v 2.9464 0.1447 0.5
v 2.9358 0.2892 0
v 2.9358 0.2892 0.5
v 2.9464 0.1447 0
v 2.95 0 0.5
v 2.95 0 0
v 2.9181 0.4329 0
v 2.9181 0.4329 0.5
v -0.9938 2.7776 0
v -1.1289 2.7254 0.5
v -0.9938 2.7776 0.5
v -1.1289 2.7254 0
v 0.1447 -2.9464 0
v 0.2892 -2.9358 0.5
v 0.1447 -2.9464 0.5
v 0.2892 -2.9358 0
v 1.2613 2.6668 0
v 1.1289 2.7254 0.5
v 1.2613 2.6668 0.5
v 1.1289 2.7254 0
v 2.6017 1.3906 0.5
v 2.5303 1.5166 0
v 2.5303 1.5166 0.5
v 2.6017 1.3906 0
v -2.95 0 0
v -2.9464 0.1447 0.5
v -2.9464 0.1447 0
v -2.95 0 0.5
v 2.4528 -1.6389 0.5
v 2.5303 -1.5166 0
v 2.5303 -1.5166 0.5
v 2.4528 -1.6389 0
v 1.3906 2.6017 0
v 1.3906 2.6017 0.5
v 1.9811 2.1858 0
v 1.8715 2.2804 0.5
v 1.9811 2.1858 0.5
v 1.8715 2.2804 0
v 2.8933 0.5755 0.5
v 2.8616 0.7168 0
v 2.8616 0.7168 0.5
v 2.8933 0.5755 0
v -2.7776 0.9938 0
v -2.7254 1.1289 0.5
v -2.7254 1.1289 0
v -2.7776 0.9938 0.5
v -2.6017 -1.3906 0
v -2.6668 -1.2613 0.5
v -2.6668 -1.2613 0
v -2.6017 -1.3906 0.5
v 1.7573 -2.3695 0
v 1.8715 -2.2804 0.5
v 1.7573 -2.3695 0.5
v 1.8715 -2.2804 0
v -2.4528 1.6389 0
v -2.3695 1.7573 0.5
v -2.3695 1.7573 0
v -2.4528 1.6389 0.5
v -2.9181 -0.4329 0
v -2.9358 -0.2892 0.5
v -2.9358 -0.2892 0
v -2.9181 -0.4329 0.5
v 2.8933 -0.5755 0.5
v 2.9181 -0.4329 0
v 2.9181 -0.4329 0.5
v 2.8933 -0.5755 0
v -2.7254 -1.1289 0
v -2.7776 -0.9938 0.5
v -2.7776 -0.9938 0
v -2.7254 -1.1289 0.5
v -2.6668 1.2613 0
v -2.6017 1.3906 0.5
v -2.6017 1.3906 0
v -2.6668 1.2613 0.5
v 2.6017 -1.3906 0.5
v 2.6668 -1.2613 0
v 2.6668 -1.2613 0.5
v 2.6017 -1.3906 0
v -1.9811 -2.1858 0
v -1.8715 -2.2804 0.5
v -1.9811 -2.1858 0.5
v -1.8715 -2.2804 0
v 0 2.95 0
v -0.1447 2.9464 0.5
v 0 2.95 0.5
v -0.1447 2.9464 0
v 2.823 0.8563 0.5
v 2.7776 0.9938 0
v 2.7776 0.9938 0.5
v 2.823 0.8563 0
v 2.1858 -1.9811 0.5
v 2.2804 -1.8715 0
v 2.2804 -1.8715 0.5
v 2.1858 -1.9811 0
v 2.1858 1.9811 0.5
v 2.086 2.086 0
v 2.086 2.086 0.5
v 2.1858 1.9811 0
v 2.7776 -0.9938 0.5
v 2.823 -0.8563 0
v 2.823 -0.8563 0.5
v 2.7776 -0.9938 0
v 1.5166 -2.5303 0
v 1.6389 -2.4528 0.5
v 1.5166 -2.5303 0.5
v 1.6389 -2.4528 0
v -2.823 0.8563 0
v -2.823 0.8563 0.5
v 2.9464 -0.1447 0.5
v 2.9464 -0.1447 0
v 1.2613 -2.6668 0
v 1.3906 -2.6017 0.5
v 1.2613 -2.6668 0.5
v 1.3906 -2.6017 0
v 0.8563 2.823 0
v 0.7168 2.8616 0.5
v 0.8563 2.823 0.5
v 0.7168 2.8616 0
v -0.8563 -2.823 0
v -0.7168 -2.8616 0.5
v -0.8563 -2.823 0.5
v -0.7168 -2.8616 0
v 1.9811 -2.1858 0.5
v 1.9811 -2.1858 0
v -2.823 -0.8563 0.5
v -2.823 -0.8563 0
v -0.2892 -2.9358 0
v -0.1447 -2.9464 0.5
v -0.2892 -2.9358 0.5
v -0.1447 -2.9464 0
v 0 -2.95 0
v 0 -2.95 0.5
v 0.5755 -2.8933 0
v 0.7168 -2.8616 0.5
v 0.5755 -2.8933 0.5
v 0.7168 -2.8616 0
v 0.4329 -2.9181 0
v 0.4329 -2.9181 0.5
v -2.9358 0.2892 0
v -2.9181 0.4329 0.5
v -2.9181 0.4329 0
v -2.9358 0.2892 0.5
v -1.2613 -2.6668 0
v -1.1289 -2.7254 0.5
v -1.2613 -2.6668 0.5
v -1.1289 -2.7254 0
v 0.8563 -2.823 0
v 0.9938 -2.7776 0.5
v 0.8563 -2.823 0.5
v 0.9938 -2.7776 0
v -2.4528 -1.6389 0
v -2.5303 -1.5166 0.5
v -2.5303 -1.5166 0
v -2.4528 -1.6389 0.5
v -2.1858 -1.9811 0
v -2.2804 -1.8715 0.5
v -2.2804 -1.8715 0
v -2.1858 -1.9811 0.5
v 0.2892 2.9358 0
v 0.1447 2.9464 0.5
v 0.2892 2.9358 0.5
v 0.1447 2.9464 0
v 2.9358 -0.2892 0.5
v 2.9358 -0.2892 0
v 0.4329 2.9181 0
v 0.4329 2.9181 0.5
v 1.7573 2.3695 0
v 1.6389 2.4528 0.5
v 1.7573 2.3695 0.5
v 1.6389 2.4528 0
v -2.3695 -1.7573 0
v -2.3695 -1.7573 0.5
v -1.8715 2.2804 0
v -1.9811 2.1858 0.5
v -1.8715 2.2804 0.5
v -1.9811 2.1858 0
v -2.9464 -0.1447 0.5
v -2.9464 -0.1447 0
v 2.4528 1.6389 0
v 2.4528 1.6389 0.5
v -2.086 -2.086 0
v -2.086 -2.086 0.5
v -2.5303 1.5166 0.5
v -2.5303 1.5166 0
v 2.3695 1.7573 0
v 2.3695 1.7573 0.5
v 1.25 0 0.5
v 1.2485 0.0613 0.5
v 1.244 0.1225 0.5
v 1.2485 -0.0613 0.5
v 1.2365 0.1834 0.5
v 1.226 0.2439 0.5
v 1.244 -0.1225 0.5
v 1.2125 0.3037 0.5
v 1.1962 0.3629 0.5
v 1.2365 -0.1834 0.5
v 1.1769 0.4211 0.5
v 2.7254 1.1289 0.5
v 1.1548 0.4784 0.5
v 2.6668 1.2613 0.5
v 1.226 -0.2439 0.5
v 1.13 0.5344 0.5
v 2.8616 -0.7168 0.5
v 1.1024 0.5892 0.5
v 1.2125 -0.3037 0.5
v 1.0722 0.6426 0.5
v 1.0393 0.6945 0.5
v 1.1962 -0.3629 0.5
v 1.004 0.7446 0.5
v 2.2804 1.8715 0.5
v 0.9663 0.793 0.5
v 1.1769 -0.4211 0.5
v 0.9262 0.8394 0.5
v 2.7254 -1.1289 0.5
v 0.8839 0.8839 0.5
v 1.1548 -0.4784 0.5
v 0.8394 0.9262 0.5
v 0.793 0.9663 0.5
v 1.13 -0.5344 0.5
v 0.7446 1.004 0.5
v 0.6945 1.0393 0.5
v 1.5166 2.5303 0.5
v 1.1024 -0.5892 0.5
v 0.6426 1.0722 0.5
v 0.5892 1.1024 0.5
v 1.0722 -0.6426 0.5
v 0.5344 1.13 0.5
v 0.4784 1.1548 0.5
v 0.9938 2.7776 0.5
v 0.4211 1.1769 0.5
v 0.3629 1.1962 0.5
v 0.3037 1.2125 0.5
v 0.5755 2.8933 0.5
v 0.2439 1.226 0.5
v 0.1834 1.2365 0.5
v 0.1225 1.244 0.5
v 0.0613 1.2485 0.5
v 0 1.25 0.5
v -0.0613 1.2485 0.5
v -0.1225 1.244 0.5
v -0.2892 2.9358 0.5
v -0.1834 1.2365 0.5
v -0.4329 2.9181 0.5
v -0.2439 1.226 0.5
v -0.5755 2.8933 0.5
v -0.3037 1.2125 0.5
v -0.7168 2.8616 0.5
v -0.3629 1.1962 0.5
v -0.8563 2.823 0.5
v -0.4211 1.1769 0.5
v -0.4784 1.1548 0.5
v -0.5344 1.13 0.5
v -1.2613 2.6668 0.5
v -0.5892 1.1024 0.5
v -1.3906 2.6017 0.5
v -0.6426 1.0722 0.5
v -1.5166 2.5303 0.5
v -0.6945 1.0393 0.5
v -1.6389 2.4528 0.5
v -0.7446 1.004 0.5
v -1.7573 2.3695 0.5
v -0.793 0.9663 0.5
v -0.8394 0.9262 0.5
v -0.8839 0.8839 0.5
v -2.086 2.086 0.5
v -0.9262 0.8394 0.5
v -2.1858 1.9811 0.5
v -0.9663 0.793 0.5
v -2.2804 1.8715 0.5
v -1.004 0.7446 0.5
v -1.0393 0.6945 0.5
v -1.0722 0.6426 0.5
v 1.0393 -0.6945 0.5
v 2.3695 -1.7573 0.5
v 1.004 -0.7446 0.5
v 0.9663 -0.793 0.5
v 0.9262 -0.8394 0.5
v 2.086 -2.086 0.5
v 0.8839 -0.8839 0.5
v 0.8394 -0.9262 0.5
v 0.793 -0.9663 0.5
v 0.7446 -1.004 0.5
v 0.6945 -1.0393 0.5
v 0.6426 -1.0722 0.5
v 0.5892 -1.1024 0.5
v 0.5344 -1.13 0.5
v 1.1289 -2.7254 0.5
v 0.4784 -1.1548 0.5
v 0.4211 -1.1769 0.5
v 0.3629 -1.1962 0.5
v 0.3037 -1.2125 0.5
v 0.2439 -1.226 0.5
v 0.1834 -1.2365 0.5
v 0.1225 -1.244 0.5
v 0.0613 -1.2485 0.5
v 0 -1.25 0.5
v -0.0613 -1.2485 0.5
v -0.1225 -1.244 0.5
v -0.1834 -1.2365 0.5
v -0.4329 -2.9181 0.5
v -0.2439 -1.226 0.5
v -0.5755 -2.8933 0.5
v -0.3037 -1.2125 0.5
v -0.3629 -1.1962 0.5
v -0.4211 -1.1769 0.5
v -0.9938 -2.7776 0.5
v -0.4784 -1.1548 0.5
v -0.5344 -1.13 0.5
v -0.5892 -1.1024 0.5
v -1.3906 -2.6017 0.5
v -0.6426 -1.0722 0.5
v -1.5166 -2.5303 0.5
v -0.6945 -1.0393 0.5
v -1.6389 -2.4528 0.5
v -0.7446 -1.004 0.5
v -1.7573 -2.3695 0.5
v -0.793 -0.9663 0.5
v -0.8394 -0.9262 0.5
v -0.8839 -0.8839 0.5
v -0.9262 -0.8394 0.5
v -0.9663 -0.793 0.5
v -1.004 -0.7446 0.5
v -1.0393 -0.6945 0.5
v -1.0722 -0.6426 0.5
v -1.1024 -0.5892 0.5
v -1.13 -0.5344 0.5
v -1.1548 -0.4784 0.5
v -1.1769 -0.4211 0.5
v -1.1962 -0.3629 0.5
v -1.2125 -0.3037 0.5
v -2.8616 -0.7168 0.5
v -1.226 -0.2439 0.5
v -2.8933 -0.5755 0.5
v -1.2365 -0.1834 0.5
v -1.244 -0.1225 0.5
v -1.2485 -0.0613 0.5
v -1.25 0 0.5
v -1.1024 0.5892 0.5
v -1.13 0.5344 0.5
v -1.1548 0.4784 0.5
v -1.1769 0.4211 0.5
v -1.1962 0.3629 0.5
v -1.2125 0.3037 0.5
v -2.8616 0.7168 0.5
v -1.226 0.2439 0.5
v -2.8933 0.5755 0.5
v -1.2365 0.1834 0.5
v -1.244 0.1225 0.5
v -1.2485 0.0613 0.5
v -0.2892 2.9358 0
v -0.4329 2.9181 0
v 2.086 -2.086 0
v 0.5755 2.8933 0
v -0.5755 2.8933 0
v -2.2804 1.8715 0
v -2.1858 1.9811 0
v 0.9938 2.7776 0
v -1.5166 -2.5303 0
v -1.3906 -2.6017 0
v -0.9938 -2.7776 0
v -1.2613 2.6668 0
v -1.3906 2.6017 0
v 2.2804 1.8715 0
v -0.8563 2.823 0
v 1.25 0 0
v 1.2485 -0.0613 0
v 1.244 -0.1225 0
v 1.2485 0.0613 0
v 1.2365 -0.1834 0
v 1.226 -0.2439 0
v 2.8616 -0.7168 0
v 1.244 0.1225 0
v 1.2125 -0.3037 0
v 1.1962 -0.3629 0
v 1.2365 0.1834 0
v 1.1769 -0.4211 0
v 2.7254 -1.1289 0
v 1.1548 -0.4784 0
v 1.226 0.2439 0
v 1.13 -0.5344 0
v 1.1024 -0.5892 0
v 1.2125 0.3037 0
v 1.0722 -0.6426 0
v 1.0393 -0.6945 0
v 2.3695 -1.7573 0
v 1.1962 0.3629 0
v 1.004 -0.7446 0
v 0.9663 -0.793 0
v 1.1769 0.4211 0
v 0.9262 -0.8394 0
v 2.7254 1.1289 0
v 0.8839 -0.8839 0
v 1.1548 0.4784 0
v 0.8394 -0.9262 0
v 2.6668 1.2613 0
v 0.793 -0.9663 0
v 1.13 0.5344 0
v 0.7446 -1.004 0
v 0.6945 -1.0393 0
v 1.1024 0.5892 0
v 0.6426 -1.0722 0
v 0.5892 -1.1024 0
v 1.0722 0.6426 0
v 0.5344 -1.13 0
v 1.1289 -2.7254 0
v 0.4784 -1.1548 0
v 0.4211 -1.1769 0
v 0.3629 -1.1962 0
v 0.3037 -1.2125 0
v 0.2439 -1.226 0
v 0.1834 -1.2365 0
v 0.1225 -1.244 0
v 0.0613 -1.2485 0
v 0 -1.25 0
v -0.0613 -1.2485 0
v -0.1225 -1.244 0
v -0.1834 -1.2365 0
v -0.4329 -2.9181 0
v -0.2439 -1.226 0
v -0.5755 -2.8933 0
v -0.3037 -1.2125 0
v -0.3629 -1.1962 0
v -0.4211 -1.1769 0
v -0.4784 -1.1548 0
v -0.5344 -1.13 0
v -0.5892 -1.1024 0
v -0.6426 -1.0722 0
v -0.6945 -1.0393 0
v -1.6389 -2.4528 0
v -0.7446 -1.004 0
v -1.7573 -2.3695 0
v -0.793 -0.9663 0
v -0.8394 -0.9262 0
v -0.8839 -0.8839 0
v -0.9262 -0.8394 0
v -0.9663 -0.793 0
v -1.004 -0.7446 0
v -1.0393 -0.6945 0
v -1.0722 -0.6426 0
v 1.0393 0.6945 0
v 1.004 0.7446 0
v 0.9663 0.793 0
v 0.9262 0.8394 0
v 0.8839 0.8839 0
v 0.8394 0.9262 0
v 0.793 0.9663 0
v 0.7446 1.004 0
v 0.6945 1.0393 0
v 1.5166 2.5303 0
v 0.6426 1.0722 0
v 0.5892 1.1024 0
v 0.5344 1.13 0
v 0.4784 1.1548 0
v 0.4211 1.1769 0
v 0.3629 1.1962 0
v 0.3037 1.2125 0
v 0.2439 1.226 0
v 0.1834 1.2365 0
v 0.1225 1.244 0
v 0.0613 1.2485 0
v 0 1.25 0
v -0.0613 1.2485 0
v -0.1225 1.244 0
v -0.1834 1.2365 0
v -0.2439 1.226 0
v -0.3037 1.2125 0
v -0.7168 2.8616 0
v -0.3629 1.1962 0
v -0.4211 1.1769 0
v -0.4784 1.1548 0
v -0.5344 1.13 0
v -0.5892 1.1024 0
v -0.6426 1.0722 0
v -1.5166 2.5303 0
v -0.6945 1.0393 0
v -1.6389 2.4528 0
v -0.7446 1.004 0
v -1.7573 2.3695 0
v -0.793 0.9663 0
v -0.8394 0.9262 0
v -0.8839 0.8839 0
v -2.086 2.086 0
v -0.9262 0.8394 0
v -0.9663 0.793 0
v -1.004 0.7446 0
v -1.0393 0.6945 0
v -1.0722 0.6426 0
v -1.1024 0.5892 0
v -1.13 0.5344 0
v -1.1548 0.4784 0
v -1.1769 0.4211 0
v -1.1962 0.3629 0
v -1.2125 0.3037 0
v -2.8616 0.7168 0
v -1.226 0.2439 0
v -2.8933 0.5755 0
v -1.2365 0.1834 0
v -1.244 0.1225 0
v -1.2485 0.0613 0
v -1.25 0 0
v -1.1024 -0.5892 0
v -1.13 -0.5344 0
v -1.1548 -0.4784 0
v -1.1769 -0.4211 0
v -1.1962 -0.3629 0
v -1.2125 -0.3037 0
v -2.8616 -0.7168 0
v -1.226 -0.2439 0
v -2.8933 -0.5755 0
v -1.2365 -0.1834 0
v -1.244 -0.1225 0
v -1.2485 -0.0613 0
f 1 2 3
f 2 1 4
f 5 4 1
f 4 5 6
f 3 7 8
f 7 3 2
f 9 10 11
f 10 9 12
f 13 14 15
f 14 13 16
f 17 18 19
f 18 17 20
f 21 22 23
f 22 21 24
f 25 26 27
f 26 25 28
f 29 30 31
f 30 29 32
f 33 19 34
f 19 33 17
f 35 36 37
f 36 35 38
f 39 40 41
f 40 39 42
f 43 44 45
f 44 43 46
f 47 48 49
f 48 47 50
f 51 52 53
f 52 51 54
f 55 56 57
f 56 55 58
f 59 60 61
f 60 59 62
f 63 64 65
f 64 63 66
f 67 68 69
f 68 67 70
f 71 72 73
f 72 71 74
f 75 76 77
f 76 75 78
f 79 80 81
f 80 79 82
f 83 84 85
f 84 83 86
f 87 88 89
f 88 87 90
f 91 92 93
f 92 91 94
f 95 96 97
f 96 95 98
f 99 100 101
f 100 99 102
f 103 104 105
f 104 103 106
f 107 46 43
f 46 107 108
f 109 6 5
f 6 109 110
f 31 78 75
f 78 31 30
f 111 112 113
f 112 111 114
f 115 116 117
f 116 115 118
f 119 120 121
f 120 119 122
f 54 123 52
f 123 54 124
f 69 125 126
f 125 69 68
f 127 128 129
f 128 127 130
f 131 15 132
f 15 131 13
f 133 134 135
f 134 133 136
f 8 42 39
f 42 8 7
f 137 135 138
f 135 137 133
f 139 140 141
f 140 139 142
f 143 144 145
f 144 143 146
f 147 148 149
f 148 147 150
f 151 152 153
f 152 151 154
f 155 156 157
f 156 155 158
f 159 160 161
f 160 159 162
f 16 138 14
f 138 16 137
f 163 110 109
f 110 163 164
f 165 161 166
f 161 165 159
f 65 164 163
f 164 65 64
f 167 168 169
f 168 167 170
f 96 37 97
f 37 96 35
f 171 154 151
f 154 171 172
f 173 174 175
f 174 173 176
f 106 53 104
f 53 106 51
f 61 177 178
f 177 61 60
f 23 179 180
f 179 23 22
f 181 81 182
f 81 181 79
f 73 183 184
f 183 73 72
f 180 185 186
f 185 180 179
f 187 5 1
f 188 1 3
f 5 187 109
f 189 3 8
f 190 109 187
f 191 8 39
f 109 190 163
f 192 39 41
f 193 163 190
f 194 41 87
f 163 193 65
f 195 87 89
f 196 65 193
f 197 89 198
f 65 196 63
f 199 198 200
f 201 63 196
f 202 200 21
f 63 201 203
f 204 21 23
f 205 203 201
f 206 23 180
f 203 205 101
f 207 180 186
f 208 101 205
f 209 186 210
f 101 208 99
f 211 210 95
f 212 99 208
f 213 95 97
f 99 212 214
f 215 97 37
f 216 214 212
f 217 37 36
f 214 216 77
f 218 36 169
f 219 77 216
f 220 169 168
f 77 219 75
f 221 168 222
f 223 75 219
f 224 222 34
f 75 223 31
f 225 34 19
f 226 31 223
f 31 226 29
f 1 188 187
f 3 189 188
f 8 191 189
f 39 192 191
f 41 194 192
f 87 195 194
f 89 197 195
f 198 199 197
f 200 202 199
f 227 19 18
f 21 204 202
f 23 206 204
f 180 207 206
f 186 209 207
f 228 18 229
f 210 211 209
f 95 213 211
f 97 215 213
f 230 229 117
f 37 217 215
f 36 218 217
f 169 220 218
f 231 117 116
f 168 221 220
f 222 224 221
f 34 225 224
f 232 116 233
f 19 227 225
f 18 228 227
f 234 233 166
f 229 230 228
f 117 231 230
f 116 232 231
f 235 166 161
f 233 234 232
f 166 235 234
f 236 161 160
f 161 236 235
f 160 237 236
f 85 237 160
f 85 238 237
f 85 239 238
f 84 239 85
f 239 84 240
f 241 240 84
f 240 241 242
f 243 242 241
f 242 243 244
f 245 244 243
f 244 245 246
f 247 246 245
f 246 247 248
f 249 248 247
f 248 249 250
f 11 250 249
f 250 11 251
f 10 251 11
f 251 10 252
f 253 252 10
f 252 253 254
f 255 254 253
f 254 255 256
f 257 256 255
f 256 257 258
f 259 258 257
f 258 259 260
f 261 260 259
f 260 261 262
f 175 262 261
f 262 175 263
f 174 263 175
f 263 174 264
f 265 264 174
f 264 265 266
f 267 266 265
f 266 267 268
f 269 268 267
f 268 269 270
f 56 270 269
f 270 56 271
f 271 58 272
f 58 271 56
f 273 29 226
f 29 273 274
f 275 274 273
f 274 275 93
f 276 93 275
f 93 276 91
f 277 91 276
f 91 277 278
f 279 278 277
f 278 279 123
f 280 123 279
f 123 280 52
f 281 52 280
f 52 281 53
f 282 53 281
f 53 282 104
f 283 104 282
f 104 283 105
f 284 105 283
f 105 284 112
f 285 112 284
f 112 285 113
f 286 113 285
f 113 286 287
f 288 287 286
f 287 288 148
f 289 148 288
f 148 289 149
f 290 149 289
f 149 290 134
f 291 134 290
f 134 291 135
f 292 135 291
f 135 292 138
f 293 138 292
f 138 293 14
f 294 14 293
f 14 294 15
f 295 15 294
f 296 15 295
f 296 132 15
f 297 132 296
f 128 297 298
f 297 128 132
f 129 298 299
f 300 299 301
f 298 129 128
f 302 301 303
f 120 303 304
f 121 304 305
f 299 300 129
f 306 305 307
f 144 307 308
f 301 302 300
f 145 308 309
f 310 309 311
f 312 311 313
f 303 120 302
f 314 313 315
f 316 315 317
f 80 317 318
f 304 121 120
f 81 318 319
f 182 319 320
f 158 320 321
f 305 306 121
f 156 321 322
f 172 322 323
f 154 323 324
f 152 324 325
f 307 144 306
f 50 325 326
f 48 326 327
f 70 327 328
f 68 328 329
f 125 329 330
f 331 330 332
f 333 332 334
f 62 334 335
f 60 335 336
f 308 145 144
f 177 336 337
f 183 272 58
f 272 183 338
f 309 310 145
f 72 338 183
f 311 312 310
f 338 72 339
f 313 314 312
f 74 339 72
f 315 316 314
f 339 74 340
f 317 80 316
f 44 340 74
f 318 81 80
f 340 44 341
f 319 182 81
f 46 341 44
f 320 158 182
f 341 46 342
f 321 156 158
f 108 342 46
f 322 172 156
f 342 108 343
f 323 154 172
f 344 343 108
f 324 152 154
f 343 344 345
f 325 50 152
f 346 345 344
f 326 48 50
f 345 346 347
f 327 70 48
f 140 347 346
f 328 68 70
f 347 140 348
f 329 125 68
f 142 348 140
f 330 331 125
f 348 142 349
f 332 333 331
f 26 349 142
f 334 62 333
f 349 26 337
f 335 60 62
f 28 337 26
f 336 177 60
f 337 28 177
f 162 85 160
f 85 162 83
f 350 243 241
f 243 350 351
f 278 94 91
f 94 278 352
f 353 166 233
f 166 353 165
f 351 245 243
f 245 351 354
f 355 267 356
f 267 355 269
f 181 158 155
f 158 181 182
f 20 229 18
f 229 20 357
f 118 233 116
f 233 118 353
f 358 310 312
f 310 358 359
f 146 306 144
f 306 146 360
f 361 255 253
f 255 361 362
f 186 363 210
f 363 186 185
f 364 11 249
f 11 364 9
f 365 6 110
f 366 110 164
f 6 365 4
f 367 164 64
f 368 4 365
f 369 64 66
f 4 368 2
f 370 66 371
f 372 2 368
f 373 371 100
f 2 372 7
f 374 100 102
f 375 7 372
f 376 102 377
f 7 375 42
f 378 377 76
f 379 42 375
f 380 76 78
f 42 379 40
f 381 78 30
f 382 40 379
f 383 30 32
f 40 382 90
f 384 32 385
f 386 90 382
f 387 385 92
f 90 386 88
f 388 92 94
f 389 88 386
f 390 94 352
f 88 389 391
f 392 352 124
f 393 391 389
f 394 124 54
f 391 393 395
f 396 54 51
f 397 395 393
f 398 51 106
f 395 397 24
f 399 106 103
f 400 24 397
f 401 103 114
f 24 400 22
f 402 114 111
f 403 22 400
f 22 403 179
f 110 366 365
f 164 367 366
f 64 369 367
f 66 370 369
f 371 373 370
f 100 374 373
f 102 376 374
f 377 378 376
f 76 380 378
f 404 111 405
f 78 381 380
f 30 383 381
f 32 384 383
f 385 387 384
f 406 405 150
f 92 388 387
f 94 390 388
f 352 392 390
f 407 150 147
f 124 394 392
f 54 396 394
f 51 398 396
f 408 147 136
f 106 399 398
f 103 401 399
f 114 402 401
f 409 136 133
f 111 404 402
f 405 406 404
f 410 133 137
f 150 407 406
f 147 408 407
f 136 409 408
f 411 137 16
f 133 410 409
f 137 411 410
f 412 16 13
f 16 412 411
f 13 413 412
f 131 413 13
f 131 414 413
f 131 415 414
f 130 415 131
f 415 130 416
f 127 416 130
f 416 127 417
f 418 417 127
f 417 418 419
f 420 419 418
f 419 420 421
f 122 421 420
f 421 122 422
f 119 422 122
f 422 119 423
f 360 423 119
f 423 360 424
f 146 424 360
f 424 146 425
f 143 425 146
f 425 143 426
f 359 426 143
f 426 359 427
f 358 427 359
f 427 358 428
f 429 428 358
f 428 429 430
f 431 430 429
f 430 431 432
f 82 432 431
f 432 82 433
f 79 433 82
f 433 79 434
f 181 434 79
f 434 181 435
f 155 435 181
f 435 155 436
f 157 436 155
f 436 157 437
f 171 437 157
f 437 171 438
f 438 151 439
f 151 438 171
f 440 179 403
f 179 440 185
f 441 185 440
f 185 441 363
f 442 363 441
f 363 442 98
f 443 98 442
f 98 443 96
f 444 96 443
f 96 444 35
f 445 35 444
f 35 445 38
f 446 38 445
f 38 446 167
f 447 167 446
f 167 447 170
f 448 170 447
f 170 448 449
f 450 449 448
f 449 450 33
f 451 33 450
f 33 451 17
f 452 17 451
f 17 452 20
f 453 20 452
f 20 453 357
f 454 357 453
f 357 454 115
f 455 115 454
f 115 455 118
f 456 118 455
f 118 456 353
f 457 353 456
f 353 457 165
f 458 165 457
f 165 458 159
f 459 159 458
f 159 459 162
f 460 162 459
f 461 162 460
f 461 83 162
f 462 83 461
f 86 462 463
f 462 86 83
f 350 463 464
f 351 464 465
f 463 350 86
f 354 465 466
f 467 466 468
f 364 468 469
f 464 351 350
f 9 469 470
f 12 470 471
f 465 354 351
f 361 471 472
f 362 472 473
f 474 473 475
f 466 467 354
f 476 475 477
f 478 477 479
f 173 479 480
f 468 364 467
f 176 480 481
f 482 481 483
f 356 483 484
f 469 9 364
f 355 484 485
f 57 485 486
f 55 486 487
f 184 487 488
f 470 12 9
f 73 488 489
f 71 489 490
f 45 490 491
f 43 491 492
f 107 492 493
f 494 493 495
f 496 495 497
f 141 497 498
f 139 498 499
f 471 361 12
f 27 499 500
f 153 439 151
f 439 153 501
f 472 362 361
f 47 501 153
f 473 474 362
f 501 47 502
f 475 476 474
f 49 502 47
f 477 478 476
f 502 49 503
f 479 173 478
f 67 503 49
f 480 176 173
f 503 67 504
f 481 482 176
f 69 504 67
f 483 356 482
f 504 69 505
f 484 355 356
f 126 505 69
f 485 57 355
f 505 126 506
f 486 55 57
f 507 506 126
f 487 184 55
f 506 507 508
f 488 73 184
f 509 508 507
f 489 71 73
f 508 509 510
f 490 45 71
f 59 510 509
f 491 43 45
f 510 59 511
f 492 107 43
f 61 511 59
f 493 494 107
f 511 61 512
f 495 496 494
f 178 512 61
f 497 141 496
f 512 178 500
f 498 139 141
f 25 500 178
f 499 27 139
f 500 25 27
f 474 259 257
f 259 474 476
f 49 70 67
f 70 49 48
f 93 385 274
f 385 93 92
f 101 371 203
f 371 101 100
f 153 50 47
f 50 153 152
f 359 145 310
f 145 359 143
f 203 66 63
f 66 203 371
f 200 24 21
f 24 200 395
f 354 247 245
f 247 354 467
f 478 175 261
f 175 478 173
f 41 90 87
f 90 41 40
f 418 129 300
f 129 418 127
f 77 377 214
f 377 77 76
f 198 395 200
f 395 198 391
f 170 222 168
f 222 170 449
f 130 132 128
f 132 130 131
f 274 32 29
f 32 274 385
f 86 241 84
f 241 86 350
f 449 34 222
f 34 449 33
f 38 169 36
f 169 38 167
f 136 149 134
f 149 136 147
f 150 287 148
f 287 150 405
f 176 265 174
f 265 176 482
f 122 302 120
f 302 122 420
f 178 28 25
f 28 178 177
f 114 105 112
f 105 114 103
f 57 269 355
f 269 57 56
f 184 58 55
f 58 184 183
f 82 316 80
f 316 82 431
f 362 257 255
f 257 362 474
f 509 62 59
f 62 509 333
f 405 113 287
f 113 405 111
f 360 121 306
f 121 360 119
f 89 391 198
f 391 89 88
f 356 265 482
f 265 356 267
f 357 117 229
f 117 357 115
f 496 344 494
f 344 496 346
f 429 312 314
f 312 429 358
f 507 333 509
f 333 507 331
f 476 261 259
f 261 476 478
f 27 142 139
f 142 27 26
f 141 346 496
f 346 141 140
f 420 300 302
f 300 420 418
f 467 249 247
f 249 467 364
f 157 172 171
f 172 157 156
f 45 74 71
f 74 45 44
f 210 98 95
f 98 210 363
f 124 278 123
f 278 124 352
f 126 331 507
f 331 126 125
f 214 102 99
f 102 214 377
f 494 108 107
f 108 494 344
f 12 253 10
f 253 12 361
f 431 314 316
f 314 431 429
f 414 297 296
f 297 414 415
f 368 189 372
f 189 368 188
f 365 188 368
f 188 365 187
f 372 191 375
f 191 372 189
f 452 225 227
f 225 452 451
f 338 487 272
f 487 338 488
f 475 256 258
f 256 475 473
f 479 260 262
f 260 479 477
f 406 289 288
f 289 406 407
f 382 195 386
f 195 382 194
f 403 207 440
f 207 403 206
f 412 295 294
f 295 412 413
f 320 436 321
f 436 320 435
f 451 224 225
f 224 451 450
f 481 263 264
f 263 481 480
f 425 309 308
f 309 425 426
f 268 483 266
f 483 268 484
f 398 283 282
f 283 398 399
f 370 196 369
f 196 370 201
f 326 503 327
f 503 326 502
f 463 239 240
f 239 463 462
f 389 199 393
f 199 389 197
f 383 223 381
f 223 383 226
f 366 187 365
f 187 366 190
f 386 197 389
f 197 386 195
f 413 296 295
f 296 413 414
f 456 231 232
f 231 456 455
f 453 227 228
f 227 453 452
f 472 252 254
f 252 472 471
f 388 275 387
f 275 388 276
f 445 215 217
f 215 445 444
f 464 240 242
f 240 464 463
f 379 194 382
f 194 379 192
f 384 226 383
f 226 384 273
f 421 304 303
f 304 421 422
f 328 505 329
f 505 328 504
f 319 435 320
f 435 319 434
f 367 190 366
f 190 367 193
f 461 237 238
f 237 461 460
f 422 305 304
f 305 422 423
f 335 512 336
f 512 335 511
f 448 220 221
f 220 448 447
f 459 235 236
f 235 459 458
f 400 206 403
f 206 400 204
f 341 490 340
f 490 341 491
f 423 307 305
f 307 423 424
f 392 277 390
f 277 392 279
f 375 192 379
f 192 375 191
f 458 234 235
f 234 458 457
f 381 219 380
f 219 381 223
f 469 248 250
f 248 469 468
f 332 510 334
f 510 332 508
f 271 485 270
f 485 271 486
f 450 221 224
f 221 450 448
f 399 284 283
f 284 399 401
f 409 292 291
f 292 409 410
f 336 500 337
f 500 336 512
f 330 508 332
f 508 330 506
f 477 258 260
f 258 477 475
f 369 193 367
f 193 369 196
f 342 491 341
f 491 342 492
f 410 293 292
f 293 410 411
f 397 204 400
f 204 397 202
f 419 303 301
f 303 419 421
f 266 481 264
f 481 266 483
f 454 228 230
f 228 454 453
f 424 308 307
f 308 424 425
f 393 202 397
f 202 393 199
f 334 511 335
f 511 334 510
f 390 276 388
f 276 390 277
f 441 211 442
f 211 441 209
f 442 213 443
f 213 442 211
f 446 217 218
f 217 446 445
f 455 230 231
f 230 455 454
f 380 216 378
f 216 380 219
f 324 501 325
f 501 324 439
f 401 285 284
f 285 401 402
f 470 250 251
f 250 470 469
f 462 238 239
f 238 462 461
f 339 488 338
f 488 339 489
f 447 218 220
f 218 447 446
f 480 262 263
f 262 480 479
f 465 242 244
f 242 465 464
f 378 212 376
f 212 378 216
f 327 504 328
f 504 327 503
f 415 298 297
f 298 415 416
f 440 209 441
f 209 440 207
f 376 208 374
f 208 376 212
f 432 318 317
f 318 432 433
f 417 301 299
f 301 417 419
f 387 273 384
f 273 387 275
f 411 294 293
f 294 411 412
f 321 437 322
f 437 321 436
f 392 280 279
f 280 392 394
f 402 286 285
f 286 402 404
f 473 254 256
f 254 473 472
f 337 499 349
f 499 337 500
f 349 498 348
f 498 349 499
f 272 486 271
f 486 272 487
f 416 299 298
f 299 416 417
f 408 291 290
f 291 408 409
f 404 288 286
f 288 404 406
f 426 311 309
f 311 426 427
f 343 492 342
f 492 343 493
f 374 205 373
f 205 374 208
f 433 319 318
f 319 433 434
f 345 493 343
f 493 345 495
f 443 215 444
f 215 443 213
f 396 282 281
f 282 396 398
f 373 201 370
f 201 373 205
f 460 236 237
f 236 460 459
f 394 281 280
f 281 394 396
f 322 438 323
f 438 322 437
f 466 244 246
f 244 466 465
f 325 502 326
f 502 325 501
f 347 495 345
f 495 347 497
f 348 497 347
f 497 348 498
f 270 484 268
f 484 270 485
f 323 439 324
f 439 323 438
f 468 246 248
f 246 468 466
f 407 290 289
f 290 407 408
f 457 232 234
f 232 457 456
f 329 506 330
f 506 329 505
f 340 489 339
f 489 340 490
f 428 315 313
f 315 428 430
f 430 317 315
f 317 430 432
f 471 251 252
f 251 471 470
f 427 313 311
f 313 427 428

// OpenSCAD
$fn = 128;

inner_d = 2.5;
outer_d = 5.9;
thickness = 0.5;

difference() {
  cylinder(d = outer_d, h = thickness);
  cylinder(d = inner_d, h = thickness + 0.2);
}
